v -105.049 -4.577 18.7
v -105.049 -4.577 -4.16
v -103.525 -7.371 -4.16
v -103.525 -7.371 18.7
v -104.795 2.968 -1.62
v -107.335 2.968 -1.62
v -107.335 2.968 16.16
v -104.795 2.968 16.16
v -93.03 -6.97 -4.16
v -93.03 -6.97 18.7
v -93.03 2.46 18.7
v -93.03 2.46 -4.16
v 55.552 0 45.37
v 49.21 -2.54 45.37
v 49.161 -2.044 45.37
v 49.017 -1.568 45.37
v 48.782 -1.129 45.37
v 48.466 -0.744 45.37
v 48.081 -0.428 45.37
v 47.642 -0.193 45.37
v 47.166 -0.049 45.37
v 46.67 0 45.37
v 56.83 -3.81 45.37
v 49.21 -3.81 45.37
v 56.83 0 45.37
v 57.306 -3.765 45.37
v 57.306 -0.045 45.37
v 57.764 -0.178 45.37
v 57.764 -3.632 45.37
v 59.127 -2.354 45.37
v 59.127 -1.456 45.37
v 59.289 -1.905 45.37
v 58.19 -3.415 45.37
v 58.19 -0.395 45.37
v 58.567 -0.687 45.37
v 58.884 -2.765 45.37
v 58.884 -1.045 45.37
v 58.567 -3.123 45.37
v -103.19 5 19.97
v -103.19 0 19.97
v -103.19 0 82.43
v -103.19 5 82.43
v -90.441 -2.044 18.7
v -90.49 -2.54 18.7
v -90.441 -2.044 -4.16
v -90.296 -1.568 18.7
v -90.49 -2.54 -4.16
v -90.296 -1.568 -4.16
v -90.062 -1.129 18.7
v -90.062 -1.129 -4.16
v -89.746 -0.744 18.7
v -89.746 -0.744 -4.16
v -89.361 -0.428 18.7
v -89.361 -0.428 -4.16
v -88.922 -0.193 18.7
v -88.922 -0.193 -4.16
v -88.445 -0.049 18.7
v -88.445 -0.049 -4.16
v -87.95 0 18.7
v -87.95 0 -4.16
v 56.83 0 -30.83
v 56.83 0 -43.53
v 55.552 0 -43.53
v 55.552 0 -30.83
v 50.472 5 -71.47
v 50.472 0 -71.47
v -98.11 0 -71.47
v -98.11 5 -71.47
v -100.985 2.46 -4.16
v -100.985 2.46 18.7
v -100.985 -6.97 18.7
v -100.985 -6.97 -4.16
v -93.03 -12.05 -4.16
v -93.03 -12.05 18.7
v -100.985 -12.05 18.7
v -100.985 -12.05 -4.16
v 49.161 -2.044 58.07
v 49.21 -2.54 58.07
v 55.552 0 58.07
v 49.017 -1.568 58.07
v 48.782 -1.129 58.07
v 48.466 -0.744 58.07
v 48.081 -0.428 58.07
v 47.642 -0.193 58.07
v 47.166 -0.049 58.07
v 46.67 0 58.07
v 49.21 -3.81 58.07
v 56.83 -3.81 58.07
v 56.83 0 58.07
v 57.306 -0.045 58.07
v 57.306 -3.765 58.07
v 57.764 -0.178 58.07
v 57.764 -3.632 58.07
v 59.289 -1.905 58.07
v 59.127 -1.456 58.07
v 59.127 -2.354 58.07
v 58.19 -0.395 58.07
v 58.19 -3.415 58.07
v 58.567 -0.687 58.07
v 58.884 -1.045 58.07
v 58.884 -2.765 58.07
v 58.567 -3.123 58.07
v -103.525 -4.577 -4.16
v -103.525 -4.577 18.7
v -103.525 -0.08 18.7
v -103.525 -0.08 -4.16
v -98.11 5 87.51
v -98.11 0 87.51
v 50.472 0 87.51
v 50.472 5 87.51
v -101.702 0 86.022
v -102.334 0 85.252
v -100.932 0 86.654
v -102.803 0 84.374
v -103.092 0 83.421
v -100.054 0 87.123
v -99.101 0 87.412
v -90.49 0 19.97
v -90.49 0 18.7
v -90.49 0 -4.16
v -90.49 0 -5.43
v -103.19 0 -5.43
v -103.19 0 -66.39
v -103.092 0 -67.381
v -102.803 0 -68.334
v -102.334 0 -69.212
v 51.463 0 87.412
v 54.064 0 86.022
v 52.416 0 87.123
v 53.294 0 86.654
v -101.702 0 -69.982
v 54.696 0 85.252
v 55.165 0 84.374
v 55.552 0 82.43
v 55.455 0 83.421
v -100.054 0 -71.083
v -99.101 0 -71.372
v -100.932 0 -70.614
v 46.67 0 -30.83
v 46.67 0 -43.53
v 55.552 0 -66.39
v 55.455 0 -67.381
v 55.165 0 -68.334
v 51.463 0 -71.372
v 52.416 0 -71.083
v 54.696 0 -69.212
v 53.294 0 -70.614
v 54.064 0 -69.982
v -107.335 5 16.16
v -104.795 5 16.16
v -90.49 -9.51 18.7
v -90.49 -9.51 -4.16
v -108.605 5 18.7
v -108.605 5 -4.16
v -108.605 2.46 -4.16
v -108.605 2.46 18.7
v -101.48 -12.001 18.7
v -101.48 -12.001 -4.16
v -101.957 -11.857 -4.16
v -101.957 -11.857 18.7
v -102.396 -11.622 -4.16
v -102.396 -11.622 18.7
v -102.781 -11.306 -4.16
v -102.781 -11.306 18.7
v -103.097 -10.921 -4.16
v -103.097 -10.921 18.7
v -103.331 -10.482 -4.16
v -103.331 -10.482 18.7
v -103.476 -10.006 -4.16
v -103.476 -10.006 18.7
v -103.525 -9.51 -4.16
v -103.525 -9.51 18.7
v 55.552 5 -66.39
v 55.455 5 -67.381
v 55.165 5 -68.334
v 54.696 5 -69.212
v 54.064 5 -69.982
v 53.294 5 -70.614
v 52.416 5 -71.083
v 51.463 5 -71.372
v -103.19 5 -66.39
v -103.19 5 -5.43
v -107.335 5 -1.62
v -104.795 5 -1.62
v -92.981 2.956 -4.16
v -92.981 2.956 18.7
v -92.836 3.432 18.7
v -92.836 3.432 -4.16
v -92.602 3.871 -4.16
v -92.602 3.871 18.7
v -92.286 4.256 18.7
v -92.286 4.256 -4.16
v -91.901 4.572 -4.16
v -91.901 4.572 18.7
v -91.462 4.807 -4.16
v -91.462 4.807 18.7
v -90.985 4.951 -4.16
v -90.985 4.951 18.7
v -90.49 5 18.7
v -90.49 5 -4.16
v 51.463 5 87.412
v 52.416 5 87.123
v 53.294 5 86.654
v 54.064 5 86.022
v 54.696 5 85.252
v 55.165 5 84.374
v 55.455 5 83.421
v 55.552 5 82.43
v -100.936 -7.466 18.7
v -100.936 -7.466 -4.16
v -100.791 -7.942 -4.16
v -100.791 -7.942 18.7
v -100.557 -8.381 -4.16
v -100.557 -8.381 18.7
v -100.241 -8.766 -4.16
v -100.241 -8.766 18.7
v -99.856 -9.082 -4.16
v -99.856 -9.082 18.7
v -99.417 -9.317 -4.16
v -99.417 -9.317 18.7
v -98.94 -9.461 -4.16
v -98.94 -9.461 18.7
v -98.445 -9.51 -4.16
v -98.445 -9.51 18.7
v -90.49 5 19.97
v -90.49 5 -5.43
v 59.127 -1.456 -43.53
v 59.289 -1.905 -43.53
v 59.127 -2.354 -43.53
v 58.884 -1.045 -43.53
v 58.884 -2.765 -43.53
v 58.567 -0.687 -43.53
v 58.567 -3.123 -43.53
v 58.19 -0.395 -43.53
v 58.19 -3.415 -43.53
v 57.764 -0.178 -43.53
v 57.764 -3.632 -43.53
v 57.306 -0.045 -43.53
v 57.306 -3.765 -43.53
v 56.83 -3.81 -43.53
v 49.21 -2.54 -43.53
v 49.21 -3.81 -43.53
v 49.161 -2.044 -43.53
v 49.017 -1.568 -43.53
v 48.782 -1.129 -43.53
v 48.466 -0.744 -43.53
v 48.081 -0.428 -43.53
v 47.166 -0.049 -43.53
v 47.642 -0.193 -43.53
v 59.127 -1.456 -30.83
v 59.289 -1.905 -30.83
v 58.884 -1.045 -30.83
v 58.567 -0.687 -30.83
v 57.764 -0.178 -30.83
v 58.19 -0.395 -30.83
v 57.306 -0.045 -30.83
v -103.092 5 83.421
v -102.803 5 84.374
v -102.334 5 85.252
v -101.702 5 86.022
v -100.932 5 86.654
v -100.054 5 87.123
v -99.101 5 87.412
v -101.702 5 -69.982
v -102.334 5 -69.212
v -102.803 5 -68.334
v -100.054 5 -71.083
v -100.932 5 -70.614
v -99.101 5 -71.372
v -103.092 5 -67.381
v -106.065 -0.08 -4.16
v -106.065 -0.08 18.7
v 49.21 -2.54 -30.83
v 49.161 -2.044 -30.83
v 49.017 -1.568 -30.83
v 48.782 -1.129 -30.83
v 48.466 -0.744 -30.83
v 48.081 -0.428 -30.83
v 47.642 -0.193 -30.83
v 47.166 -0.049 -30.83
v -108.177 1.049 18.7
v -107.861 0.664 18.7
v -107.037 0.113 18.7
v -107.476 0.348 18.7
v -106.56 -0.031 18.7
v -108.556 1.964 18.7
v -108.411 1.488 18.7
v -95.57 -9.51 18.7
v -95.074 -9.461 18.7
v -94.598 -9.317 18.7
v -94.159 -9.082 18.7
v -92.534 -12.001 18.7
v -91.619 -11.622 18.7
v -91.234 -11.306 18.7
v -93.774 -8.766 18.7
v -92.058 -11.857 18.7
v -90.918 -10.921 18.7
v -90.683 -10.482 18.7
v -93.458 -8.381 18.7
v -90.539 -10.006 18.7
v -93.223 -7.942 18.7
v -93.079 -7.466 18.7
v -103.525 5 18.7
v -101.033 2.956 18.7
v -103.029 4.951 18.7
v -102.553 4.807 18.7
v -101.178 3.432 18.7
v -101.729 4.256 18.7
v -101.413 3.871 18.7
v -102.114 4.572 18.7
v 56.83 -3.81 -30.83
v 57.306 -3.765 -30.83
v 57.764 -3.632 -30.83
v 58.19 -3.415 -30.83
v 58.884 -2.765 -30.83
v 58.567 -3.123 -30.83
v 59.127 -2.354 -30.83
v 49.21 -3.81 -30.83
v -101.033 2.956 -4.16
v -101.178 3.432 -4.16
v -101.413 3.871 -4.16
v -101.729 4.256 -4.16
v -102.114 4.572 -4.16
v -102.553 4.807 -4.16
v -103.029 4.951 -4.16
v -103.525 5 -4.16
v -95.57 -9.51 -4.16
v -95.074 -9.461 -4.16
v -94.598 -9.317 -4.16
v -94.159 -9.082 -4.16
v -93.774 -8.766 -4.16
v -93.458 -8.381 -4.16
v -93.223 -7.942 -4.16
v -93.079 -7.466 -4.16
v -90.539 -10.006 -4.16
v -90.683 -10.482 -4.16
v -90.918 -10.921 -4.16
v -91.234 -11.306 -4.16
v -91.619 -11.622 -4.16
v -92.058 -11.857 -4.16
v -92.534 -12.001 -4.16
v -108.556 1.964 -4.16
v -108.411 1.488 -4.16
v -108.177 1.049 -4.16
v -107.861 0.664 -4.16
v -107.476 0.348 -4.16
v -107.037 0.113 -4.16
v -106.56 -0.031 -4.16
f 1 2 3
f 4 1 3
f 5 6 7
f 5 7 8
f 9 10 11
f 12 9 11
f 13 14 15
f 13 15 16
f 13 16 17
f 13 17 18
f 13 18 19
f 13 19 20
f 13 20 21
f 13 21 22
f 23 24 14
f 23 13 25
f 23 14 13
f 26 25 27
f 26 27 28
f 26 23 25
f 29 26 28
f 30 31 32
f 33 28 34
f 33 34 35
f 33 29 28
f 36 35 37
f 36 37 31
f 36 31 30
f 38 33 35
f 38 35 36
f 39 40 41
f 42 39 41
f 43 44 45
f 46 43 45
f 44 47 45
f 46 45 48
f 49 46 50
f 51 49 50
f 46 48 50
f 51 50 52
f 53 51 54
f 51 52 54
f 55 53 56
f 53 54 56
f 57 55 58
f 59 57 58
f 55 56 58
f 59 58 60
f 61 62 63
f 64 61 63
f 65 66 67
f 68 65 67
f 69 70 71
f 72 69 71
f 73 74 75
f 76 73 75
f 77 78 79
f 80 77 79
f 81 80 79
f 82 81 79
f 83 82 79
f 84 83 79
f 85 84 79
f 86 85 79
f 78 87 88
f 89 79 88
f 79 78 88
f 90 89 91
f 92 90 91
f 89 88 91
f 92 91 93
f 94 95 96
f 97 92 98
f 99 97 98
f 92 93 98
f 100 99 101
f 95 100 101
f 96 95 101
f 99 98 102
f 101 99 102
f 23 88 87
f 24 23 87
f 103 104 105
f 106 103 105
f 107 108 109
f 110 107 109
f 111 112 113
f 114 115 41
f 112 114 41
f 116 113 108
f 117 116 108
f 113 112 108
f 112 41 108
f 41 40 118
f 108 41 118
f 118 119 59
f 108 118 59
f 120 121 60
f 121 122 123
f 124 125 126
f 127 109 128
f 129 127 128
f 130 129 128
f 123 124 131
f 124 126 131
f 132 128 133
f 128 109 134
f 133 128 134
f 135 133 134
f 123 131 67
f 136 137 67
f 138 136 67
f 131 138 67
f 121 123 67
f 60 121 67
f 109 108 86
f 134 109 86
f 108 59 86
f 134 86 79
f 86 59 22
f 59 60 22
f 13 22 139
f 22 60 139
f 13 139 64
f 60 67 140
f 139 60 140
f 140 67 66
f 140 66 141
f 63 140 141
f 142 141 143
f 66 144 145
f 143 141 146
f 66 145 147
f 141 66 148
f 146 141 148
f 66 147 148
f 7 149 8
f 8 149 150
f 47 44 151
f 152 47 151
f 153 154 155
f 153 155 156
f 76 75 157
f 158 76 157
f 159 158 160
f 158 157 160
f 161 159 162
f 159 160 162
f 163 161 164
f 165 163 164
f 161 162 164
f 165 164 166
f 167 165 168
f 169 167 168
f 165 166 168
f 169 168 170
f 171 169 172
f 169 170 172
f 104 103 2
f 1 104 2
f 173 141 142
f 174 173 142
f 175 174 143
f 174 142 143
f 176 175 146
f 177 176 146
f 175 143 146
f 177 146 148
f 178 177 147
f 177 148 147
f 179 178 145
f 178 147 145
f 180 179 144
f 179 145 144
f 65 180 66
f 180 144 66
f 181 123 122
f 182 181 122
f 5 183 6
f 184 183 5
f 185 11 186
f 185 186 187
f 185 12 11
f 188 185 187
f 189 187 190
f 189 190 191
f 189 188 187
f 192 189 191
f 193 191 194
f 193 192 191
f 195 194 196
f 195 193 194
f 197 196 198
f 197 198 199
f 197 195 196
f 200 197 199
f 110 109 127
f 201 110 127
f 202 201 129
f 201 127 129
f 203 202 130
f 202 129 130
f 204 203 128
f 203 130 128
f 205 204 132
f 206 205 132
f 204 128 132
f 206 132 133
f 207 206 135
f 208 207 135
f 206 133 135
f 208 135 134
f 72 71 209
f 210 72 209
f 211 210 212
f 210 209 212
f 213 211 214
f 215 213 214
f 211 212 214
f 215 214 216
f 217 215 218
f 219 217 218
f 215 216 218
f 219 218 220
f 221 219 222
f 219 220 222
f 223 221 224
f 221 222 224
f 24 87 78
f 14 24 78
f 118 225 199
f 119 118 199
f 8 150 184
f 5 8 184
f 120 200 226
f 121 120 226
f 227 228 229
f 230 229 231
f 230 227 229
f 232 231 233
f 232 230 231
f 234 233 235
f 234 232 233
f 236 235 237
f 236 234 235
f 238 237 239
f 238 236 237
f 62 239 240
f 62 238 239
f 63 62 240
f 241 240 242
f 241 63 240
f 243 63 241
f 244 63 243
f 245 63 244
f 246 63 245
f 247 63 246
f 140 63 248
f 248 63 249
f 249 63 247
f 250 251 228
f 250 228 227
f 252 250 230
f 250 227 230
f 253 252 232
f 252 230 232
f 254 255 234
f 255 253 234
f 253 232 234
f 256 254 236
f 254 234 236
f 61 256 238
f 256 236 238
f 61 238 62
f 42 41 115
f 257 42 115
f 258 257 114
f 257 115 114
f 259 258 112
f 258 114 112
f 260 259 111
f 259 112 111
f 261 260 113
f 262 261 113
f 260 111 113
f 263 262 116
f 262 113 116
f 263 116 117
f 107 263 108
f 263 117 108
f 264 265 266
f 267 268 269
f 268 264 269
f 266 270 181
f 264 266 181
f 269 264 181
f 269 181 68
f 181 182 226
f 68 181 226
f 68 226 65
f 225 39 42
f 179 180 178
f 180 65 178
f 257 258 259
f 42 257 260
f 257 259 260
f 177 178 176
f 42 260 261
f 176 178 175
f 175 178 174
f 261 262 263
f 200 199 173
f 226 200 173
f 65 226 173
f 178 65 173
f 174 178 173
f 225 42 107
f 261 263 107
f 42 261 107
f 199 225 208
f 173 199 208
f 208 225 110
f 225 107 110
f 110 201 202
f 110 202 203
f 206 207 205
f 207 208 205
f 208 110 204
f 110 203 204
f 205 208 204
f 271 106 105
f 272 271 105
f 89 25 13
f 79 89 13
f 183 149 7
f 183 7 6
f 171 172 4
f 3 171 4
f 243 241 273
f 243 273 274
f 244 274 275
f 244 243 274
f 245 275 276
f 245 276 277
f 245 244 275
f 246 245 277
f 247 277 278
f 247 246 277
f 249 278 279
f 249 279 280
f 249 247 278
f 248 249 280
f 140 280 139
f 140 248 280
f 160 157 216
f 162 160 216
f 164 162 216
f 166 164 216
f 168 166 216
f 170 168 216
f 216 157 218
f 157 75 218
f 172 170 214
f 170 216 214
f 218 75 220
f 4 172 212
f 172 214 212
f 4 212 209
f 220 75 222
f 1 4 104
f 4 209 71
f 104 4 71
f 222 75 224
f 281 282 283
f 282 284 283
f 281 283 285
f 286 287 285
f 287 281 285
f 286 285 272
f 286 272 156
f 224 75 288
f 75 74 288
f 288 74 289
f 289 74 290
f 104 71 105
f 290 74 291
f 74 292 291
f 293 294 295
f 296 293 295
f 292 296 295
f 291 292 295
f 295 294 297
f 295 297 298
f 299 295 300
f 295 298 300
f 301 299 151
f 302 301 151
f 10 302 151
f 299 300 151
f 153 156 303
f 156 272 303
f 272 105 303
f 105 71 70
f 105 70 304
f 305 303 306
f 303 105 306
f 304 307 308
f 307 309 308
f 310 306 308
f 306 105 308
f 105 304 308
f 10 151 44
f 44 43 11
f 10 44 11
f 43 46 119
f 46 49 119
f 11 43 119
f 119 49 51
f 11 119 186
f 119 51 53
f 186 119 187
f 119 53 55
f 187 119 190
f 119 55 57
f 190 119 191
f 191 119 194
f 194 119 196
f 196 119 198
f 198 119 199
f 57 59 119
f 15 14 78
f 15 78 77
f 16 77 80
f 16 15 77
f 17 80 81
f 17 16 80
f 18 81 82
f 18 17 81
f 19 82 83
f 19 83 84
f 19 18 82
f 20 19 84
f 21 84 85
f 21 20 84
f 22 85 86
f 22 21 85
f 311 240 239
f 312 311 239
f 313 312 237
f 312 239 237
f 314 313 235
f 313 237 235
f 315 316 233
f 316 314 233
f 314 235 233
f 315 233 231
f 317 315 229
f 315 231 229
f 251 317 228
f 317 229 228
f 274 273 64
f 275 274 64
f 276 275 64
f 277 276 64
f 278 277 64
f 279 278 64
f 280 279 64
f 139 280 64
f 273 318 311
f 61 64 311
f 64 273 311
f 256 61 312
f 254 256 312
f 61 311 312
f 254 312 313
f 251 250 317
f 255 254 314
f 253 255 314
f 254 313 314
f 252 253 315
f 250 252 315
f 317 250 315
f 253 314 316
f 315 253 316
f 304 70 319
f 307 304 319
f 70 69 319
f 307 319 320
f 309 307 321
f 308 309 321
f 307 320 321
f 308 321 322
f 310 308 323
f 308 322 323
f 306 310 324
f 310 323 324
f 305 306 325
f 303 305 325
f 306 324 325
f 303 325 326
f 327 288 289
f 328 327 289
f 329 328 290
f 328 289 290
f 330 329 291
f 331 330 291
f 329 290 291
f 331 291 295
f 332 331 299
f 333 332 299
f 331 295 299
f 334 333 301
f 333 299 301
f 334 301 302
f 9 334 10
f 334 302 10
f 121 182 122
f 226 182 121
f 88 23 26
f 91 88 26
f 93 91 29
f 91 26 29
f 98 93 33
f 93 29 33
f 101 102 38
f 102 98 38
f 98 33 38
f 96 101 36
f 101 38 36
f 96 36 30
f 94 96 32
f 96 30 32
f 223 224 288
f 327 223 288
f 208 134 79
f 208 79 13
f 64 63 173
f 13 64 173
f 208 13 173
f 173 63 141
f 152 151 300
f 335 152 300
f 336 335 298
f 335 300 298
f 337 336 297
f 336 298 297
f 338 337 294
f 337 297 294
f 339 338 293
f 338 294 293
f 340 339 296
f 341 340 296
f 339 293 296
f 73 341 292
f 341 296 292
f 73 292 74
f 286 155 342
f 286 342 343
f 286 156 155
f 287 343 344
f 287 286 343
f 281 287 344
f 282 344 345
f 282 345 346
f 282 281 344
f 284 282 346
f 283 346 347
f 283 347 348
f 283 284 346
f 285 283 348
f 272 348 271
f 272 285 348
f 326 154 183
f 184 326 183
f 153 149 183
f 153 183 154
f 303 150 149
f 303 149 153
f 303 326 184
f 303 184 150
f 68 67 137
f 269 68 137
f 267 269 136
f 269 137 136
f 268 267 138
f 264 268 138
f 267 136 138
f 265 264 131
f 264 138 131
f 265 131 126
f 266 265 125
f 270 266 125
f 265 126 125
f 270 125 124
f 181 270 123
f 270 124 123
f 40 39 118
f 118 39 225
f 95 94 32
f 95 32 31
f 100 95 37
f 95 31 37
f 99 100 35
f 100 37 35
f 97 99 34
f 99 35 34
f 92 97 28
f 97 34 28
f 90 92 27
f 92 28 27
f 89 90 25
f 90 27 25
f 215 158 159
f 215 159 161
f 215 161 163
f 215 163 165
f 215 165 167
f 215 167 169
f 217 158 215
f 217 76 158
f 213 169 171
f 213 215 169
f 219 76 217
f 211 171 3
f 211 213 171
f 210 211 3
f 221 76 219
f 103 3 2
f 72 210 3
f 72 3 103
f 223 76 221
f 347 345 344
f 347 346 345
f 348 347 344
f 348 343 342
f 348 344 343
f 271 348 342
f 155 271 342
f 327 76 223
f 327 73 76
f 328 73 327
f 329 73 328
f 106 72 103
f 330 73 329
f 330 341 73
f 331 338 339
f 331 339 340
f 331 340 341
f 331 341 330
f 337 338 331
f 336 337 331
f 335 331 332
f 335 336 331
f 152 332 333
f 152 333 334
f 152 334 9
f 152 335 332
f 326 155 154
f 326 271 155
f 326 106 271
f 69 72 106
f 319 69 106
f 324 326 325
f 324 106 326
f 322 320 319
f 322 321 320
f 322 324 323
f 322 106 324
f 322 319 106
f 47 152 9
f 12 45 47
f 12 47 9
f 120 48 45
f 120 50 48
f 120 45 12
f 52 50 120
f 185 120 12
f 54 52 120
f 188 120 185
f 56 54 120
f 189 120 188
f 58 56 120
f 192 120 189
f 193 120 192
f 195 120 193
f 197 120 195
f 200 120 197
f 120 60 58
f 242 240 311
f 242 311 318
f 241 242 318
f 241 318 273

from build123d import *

# Parameters (mm, degrees)
BOSS_EXTRUDE1_DEPTH  = 5
SKETCH8_W            = 12.7
SKETCH8_H            = 25.4
CUT_EXTRUDE1_DEPTH   = 12.7
BOSS_EXTRUDE6_START  = 1.27
BOSS_EXTRUDE6_DEPTH  = 22.86
FILLET3_R            = 2.54
SKETCH12_W           = 22.86
SKETCH12_H           = 5.08
BOSS_EXTRUDE7_DEPTH  = 5.08
FILLET8_R            = 2.54
SKETCH13_W           = 2.54
SKETCH13_H           = 17.78
CUT_EXTRUDE2_DEPTH   = 2.032
BOSS_EXTRUDE8_DEPTH  = 22.86
FILLET5_R            = 2.54
FILLET6_R            = 2.54
BOSS_EXTRUDE9_START  = -27.94
SKETCH15_W           = 10.16
SKETCH15_H           = 3.81
BOSS_EXTRUDE9_DEPTH  = 12.7
BOSS_EXTRUDE10_START = -116.84
SKETCH15_2_W         = 10.16
SKETCH15_2_H         = 3.81
BOSS_EXTRUDE10_DEPTH = 12.7
FILLET7_R            = 2.54


with BuildPart() as part:
    # Sketch2 → Boss-Extrude1 (new body)
    with BuildSketch(Plane(origin=(0, 0, 0), x_dir=(1, 0, 0), z_dir=(0, 1, 0))):
        with BuildLine():
            Line((-98.109845206, -87.510053172), (50.472154842, -87.510053172))
            ThreePointArc((50.472154842, -87.510053172), (54.064257291, -86.02215562), (55.552154842, -82.430053172))
            Line((55.552154842, -82.430053172), (55.552154842, 66.389946828))
            ThreePointArc((55.552154842, 66.389946828), (54.064257291, 69.982049277), (50.472154842, 71.469946828))
            Line((50.472154842, 71.469946828), (-98.109845206, 71.469946828))
            ThreePointArc((-98.109845206, 71.469946828), (-101.701947654, 69.982049277), (-103.189845206, 66.389946828))
            Line((-103.189845206, 66.389946828), (-103.189845206, -82.430053172))
            ThreePointArc((-103.189845206, -82.430053172), (-101.701947654, -86.02215562), (-98.109845206, -87.510053172))
        make_face()
    extrude(amount=BOSS_EXTRUDE1_DEPTH)

    # Sketch8 → Cut-Extrude1 (cut)
    with BuildSketch(Plane(origin=(0, 5, 0), x_dir=(1, 0, 0), z_dir=(0, 1, 0))):
        with Locations((-96.839845206, -7.270053172)):
            Rectangle(SKETCH8_W, SKETCH8_H)
    extrude(amount=-CUT_EXTRUDE1_DEPTH, mode=Mode.SUBTRACT)

    # Sketch9 → Boss-Extrude6 (add)
    with BuildSketch(Plane(origin=(0, 0, 19.970053172), x_dir=(-1, 0, 0), z_dir=(0, 0, -1)).offset(BOSS_EXTRUDE6_START)):
        with BuildLine():
            Line((90.489845206, 5), (90.489845206, -9.510091846))
            ThreePointArc((90.489845206, -9.510091846), (91.233793982, -11.30614307), (93.029845206, -12.050091846))
            Line((93.029845206, -12.050091846), (100.984663509, -12.050091846))
            ThreePointArc((100.984663509, -12.050091846), (102.780714734, -11.30614307), (103.524663509, -9.510091846))
            Line((103.524663509, -9.510091846), (103.524663509, 5))
            Line((103.524663509, 5), (100.984663509, 5))
            Line((100.984663509, 5), (100.984663509, -6.970091846))
            ThreePointArc((100.984663509, -6.970091846), (100.240714734, -8.76614307), (98.444663509, -9.510091846))
            Line((98.444663509, -9.510091846), (95.569845206, -9.510091846))
            ThreePointArc((95.569845206, -9.510091846), (93.773793982, -8.76614307), (93.029845206, -6.970091846))
            Line((93.029845206, -6.970091846), (93.029845206, 5))
            Line((93.029845206, 5), (90.489845206, 5))
        make_face()
    extrude(amount=BOSS_EXTRUDE6_DEPTH)

    # Fillet3
    fillet3_edges = [part.edges().sort_by_distance(p)[0] for p in [
        (-90.489845206, 0, 7.270053172),
    ]]
    fillet(fillet3_edges, radius=FILLET3_R)

    # Sketch12 → Boss-Extrude7 (add)
    with BuildSketch(Plane.ZY.offset(103.524663509)):
        with Locations((7.270053172, 2.46)):
            Rectangle(SKETCH12_W, SKETCH12_H)
    extrude(amount=BOSS_EXTRUDE7_DEPTH)

    # Fillet8
    fillet8_edges = [part.edges().sort_by_distance(p)[0] for p in [
        (-100.984663509, 5, 7.270053172),
    ]]
    fillet(fillet8_edges, radius=FILLET8_R)

    # Sketch13 → Cut-Extrude2 (cut)
    with BuildSketch(Plane(origin=(0, 5, 0), x_dir=(1, 0, 0), z_dir=(0, 1, 0))):
        with Locations((-106.064663509, -7.270053172)):
            Rectangle(SKETCH13_W, SKETCH13_H)
    extrude(amount=-CUT_EXTRUDE2_DEPTH, mode=Mode.SUBTRACT)

    # Sketch14 → Boss-Extrude8 (add)
    with BuildSketch(Plane(origin=(0, 0, -4.159946828), x_dir=(-1, 0, 0), z_dir=(0, 0, -1))):
        Polygon((103.524663509, -4.576775108), (105.048663509, -4.576775108), (103.524663509, -7.370775108), align=None)
    extrude(amount=-BOSS_EXTRUDE8_DEPTH)

    # Fillet5
    fillet5_edges = [part.edges().sort_by_distance(p)[0] for p in [
        (-93.029845206, 5, 7.270053172),
    ]]
    fillet(fillet5_edges, radius=FILLET5_R)

    # Fillet6
    fillet6_edges = [part.edges().sort_by_distance(p)[0] for p in [
        (-108.604663509, -0.08, 7.270053172),
    ]]
    fillet(fillet6_edges, radius=FILLET6_R)

    # Sketch15 → Boss-Extrude9 (add)
    with BuildSketch(Plane(origin=(0, 0, -71.469946828), x_dir=(-1, 0, 0), z_dir=(0, 0, -1)).offset(BOSS_EXTRUDE9_START)):
        with Locations((-54.290154794, -1.905)):
            Rectangle(SKETCH15_W, SKETCH15_H)
    extrude(amount=-BOSS_EXTRUDE9_DEPTH)

    # Sketch15<2> → Boss-Extrude10 (add)
    with BuildSketch(Plane(origin=(0, 0, -71.469946828), x_dir=(-1, 0, 0), z_dir=(0, 0, -1)).offset(BOSS_EXTRUDE10_START)):
        with Locations((-54.290154794, -1.905)):
            Rectangle(SKETCH15_2_W, SKETCH15_2_H)
    extrude(amount=-BOSS_EXTRUDE10_DEPTH)

    # Fillet7
    # the kernel refuses this fillet: 2.54 mm, written as the material it adds along each edge
    with BuildSketch(Plane(origin=(49.210154794, 0, 45.370053172), x_dir=(-1, 0, 0), z_dir=(0, 0, 1)), Plane(origin=(49.210154794, 0, -43.529946828), x_dir=(-1, 0, 0), z_dir=(0, 0, 1))) as fillet7_piece_1:
        with BuildLine():
            CenterArc((FILLET7_R, FILLET7_R), FILLET7_R, 180, 90)
            Line((0, FILLET7_R), (0, 0))
            Line((0, 0), (FILLET7_R, 0))
        make_face()
    extrude(amount=12.7)
    # the kernel refuses this fillet: 2.54 mm, written as the material it takes off along each edge
    with BuildSketch(Plane(origin=(59.370154794, 0, 39.020053172), x_dir=(-1, 0, 0), z_dir=(0, 0, 1)), Plane(origin=(59.370154794, -3.81, 39.020053172), x_dir=(0, 1, 0), z_dir=(0, 0, 1)), Plane(origin=(59.370154794, -3.81, -49.879946828), x_dir=(0, 1, 0), z_dir=(0, 0, 1)), Plane(origin=(59.370154794, 0, -49.879946828), x_dir=(-1, 0, 0), z_dir=(0, 0, 1))) as fillet7_2_piece_1:
        with BuildLine():
            CenterArc((FILLET7_R, FILLET7_R), FILLET7_R, 180, 90)
            Line((0, FILLET7_R), (0, 0))
            Line((0, 0), (FILLET7_R, 0))
        make_face()
    extrude(amount=25.4, mode=Mode.SUBTRACT)


solid = part.part
